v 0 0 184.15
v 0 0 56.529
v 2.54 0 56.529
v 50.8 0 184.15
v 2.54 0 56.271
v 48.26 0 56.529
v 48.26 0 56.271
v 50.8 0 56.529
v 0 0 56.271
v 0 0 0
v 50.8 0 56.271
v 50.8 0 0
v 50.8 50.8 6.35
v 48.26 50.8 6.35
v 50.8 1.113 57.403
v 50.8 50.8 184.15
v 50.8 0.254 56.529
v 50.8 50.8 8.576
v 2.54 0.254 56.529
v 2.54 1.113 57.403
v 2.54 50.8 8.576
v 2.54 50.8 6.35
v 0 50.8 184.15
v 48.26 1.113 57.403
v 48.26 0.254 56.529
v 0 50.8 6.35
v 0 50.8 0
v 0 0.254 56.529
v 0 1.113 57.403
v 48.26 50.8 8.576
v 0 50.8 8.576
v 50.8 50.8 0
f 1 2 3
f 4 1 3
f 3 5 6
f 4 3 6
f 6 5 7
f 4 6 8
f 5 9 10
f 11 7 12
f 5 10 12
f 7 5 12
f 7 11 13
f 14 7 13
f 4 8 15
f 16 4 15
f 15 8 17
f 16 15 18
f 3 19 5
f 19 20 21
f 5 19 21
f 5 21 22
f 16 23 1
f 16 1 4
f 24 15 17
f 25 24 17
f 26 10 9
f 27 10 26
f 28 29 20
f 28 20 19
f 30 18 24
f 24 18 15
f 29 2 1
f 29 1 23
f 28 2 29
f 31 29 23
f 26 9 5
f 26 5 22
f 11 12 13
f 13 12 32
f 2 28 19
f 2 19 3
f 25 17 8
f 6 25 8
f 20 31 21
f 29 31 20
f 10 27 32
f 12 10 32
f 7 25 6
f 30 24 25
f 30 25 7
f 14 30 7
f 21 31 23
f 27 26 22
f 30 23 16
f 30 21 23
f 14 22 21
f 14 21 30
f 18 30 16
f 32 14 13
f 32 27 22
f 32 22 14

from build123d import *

# Parameters (mm, degrees)
SKETCH1_W           = 50.8
SKETCH1_H           = 50.8
BOSS_EXTRUDE1_DEPTH = 184.15
CUT_EXTRUDE1_DEPTH  = 2.54
CUT_EXTRUDE2_START  = -50.8
CUT_EXTRUDE2_DEPTH  = 2.54


with BuildPart() as part:
    # Sketch1 → Boss-Extrude1 (new body)
    with BuildSketch(Plane.XY):
        with Locations((25.4, 25.4)):
            Rectangle(SKETCH1_W, SKETCH1_H)
    extrude(amount=BOSS_EXTRUDE1_DEPTH)

    # Sketch2 → Cut-Extrude1 (cut)
    with BuildSketch(Plane(origin=(50.8, 0, 0), x_dir=(0, 0, -1), z_dir=(1, 0, 0))):
        Polygon((-56.271020966, 0), (-6.35, 50.8), (-8.575725903, 50.8), (-57.403306054, 1.112693457), (-56.529493244, 0.254), (-56.529493244, 0), align=None)
    extrude(amount=-CUT_EXTRUDE1_DEPTH, mode=Mode.SUBTRACT)

    # Sketch2<2> → Cut-Extrude2 (cut)
    with BuildSketch(Plane(origin=(50.8, 0, 0), x_dir=(0, 0, -1), z_dir=(1, 0, 0)).offset(CUT_EXTRUDE2_START)):
        Polygon((-56.271020966, 0), (-6.35, 50.8), (-8.575725903, 50.8), (-57.403306054, 1.112693457), (-56.529493244, 0.254), (-56.529493244, 0), align=None)
    extrude(amount=CUT_EXTRUDE2_DEPTH, mode=Mode.SUBTRACT)


solid = part.part
